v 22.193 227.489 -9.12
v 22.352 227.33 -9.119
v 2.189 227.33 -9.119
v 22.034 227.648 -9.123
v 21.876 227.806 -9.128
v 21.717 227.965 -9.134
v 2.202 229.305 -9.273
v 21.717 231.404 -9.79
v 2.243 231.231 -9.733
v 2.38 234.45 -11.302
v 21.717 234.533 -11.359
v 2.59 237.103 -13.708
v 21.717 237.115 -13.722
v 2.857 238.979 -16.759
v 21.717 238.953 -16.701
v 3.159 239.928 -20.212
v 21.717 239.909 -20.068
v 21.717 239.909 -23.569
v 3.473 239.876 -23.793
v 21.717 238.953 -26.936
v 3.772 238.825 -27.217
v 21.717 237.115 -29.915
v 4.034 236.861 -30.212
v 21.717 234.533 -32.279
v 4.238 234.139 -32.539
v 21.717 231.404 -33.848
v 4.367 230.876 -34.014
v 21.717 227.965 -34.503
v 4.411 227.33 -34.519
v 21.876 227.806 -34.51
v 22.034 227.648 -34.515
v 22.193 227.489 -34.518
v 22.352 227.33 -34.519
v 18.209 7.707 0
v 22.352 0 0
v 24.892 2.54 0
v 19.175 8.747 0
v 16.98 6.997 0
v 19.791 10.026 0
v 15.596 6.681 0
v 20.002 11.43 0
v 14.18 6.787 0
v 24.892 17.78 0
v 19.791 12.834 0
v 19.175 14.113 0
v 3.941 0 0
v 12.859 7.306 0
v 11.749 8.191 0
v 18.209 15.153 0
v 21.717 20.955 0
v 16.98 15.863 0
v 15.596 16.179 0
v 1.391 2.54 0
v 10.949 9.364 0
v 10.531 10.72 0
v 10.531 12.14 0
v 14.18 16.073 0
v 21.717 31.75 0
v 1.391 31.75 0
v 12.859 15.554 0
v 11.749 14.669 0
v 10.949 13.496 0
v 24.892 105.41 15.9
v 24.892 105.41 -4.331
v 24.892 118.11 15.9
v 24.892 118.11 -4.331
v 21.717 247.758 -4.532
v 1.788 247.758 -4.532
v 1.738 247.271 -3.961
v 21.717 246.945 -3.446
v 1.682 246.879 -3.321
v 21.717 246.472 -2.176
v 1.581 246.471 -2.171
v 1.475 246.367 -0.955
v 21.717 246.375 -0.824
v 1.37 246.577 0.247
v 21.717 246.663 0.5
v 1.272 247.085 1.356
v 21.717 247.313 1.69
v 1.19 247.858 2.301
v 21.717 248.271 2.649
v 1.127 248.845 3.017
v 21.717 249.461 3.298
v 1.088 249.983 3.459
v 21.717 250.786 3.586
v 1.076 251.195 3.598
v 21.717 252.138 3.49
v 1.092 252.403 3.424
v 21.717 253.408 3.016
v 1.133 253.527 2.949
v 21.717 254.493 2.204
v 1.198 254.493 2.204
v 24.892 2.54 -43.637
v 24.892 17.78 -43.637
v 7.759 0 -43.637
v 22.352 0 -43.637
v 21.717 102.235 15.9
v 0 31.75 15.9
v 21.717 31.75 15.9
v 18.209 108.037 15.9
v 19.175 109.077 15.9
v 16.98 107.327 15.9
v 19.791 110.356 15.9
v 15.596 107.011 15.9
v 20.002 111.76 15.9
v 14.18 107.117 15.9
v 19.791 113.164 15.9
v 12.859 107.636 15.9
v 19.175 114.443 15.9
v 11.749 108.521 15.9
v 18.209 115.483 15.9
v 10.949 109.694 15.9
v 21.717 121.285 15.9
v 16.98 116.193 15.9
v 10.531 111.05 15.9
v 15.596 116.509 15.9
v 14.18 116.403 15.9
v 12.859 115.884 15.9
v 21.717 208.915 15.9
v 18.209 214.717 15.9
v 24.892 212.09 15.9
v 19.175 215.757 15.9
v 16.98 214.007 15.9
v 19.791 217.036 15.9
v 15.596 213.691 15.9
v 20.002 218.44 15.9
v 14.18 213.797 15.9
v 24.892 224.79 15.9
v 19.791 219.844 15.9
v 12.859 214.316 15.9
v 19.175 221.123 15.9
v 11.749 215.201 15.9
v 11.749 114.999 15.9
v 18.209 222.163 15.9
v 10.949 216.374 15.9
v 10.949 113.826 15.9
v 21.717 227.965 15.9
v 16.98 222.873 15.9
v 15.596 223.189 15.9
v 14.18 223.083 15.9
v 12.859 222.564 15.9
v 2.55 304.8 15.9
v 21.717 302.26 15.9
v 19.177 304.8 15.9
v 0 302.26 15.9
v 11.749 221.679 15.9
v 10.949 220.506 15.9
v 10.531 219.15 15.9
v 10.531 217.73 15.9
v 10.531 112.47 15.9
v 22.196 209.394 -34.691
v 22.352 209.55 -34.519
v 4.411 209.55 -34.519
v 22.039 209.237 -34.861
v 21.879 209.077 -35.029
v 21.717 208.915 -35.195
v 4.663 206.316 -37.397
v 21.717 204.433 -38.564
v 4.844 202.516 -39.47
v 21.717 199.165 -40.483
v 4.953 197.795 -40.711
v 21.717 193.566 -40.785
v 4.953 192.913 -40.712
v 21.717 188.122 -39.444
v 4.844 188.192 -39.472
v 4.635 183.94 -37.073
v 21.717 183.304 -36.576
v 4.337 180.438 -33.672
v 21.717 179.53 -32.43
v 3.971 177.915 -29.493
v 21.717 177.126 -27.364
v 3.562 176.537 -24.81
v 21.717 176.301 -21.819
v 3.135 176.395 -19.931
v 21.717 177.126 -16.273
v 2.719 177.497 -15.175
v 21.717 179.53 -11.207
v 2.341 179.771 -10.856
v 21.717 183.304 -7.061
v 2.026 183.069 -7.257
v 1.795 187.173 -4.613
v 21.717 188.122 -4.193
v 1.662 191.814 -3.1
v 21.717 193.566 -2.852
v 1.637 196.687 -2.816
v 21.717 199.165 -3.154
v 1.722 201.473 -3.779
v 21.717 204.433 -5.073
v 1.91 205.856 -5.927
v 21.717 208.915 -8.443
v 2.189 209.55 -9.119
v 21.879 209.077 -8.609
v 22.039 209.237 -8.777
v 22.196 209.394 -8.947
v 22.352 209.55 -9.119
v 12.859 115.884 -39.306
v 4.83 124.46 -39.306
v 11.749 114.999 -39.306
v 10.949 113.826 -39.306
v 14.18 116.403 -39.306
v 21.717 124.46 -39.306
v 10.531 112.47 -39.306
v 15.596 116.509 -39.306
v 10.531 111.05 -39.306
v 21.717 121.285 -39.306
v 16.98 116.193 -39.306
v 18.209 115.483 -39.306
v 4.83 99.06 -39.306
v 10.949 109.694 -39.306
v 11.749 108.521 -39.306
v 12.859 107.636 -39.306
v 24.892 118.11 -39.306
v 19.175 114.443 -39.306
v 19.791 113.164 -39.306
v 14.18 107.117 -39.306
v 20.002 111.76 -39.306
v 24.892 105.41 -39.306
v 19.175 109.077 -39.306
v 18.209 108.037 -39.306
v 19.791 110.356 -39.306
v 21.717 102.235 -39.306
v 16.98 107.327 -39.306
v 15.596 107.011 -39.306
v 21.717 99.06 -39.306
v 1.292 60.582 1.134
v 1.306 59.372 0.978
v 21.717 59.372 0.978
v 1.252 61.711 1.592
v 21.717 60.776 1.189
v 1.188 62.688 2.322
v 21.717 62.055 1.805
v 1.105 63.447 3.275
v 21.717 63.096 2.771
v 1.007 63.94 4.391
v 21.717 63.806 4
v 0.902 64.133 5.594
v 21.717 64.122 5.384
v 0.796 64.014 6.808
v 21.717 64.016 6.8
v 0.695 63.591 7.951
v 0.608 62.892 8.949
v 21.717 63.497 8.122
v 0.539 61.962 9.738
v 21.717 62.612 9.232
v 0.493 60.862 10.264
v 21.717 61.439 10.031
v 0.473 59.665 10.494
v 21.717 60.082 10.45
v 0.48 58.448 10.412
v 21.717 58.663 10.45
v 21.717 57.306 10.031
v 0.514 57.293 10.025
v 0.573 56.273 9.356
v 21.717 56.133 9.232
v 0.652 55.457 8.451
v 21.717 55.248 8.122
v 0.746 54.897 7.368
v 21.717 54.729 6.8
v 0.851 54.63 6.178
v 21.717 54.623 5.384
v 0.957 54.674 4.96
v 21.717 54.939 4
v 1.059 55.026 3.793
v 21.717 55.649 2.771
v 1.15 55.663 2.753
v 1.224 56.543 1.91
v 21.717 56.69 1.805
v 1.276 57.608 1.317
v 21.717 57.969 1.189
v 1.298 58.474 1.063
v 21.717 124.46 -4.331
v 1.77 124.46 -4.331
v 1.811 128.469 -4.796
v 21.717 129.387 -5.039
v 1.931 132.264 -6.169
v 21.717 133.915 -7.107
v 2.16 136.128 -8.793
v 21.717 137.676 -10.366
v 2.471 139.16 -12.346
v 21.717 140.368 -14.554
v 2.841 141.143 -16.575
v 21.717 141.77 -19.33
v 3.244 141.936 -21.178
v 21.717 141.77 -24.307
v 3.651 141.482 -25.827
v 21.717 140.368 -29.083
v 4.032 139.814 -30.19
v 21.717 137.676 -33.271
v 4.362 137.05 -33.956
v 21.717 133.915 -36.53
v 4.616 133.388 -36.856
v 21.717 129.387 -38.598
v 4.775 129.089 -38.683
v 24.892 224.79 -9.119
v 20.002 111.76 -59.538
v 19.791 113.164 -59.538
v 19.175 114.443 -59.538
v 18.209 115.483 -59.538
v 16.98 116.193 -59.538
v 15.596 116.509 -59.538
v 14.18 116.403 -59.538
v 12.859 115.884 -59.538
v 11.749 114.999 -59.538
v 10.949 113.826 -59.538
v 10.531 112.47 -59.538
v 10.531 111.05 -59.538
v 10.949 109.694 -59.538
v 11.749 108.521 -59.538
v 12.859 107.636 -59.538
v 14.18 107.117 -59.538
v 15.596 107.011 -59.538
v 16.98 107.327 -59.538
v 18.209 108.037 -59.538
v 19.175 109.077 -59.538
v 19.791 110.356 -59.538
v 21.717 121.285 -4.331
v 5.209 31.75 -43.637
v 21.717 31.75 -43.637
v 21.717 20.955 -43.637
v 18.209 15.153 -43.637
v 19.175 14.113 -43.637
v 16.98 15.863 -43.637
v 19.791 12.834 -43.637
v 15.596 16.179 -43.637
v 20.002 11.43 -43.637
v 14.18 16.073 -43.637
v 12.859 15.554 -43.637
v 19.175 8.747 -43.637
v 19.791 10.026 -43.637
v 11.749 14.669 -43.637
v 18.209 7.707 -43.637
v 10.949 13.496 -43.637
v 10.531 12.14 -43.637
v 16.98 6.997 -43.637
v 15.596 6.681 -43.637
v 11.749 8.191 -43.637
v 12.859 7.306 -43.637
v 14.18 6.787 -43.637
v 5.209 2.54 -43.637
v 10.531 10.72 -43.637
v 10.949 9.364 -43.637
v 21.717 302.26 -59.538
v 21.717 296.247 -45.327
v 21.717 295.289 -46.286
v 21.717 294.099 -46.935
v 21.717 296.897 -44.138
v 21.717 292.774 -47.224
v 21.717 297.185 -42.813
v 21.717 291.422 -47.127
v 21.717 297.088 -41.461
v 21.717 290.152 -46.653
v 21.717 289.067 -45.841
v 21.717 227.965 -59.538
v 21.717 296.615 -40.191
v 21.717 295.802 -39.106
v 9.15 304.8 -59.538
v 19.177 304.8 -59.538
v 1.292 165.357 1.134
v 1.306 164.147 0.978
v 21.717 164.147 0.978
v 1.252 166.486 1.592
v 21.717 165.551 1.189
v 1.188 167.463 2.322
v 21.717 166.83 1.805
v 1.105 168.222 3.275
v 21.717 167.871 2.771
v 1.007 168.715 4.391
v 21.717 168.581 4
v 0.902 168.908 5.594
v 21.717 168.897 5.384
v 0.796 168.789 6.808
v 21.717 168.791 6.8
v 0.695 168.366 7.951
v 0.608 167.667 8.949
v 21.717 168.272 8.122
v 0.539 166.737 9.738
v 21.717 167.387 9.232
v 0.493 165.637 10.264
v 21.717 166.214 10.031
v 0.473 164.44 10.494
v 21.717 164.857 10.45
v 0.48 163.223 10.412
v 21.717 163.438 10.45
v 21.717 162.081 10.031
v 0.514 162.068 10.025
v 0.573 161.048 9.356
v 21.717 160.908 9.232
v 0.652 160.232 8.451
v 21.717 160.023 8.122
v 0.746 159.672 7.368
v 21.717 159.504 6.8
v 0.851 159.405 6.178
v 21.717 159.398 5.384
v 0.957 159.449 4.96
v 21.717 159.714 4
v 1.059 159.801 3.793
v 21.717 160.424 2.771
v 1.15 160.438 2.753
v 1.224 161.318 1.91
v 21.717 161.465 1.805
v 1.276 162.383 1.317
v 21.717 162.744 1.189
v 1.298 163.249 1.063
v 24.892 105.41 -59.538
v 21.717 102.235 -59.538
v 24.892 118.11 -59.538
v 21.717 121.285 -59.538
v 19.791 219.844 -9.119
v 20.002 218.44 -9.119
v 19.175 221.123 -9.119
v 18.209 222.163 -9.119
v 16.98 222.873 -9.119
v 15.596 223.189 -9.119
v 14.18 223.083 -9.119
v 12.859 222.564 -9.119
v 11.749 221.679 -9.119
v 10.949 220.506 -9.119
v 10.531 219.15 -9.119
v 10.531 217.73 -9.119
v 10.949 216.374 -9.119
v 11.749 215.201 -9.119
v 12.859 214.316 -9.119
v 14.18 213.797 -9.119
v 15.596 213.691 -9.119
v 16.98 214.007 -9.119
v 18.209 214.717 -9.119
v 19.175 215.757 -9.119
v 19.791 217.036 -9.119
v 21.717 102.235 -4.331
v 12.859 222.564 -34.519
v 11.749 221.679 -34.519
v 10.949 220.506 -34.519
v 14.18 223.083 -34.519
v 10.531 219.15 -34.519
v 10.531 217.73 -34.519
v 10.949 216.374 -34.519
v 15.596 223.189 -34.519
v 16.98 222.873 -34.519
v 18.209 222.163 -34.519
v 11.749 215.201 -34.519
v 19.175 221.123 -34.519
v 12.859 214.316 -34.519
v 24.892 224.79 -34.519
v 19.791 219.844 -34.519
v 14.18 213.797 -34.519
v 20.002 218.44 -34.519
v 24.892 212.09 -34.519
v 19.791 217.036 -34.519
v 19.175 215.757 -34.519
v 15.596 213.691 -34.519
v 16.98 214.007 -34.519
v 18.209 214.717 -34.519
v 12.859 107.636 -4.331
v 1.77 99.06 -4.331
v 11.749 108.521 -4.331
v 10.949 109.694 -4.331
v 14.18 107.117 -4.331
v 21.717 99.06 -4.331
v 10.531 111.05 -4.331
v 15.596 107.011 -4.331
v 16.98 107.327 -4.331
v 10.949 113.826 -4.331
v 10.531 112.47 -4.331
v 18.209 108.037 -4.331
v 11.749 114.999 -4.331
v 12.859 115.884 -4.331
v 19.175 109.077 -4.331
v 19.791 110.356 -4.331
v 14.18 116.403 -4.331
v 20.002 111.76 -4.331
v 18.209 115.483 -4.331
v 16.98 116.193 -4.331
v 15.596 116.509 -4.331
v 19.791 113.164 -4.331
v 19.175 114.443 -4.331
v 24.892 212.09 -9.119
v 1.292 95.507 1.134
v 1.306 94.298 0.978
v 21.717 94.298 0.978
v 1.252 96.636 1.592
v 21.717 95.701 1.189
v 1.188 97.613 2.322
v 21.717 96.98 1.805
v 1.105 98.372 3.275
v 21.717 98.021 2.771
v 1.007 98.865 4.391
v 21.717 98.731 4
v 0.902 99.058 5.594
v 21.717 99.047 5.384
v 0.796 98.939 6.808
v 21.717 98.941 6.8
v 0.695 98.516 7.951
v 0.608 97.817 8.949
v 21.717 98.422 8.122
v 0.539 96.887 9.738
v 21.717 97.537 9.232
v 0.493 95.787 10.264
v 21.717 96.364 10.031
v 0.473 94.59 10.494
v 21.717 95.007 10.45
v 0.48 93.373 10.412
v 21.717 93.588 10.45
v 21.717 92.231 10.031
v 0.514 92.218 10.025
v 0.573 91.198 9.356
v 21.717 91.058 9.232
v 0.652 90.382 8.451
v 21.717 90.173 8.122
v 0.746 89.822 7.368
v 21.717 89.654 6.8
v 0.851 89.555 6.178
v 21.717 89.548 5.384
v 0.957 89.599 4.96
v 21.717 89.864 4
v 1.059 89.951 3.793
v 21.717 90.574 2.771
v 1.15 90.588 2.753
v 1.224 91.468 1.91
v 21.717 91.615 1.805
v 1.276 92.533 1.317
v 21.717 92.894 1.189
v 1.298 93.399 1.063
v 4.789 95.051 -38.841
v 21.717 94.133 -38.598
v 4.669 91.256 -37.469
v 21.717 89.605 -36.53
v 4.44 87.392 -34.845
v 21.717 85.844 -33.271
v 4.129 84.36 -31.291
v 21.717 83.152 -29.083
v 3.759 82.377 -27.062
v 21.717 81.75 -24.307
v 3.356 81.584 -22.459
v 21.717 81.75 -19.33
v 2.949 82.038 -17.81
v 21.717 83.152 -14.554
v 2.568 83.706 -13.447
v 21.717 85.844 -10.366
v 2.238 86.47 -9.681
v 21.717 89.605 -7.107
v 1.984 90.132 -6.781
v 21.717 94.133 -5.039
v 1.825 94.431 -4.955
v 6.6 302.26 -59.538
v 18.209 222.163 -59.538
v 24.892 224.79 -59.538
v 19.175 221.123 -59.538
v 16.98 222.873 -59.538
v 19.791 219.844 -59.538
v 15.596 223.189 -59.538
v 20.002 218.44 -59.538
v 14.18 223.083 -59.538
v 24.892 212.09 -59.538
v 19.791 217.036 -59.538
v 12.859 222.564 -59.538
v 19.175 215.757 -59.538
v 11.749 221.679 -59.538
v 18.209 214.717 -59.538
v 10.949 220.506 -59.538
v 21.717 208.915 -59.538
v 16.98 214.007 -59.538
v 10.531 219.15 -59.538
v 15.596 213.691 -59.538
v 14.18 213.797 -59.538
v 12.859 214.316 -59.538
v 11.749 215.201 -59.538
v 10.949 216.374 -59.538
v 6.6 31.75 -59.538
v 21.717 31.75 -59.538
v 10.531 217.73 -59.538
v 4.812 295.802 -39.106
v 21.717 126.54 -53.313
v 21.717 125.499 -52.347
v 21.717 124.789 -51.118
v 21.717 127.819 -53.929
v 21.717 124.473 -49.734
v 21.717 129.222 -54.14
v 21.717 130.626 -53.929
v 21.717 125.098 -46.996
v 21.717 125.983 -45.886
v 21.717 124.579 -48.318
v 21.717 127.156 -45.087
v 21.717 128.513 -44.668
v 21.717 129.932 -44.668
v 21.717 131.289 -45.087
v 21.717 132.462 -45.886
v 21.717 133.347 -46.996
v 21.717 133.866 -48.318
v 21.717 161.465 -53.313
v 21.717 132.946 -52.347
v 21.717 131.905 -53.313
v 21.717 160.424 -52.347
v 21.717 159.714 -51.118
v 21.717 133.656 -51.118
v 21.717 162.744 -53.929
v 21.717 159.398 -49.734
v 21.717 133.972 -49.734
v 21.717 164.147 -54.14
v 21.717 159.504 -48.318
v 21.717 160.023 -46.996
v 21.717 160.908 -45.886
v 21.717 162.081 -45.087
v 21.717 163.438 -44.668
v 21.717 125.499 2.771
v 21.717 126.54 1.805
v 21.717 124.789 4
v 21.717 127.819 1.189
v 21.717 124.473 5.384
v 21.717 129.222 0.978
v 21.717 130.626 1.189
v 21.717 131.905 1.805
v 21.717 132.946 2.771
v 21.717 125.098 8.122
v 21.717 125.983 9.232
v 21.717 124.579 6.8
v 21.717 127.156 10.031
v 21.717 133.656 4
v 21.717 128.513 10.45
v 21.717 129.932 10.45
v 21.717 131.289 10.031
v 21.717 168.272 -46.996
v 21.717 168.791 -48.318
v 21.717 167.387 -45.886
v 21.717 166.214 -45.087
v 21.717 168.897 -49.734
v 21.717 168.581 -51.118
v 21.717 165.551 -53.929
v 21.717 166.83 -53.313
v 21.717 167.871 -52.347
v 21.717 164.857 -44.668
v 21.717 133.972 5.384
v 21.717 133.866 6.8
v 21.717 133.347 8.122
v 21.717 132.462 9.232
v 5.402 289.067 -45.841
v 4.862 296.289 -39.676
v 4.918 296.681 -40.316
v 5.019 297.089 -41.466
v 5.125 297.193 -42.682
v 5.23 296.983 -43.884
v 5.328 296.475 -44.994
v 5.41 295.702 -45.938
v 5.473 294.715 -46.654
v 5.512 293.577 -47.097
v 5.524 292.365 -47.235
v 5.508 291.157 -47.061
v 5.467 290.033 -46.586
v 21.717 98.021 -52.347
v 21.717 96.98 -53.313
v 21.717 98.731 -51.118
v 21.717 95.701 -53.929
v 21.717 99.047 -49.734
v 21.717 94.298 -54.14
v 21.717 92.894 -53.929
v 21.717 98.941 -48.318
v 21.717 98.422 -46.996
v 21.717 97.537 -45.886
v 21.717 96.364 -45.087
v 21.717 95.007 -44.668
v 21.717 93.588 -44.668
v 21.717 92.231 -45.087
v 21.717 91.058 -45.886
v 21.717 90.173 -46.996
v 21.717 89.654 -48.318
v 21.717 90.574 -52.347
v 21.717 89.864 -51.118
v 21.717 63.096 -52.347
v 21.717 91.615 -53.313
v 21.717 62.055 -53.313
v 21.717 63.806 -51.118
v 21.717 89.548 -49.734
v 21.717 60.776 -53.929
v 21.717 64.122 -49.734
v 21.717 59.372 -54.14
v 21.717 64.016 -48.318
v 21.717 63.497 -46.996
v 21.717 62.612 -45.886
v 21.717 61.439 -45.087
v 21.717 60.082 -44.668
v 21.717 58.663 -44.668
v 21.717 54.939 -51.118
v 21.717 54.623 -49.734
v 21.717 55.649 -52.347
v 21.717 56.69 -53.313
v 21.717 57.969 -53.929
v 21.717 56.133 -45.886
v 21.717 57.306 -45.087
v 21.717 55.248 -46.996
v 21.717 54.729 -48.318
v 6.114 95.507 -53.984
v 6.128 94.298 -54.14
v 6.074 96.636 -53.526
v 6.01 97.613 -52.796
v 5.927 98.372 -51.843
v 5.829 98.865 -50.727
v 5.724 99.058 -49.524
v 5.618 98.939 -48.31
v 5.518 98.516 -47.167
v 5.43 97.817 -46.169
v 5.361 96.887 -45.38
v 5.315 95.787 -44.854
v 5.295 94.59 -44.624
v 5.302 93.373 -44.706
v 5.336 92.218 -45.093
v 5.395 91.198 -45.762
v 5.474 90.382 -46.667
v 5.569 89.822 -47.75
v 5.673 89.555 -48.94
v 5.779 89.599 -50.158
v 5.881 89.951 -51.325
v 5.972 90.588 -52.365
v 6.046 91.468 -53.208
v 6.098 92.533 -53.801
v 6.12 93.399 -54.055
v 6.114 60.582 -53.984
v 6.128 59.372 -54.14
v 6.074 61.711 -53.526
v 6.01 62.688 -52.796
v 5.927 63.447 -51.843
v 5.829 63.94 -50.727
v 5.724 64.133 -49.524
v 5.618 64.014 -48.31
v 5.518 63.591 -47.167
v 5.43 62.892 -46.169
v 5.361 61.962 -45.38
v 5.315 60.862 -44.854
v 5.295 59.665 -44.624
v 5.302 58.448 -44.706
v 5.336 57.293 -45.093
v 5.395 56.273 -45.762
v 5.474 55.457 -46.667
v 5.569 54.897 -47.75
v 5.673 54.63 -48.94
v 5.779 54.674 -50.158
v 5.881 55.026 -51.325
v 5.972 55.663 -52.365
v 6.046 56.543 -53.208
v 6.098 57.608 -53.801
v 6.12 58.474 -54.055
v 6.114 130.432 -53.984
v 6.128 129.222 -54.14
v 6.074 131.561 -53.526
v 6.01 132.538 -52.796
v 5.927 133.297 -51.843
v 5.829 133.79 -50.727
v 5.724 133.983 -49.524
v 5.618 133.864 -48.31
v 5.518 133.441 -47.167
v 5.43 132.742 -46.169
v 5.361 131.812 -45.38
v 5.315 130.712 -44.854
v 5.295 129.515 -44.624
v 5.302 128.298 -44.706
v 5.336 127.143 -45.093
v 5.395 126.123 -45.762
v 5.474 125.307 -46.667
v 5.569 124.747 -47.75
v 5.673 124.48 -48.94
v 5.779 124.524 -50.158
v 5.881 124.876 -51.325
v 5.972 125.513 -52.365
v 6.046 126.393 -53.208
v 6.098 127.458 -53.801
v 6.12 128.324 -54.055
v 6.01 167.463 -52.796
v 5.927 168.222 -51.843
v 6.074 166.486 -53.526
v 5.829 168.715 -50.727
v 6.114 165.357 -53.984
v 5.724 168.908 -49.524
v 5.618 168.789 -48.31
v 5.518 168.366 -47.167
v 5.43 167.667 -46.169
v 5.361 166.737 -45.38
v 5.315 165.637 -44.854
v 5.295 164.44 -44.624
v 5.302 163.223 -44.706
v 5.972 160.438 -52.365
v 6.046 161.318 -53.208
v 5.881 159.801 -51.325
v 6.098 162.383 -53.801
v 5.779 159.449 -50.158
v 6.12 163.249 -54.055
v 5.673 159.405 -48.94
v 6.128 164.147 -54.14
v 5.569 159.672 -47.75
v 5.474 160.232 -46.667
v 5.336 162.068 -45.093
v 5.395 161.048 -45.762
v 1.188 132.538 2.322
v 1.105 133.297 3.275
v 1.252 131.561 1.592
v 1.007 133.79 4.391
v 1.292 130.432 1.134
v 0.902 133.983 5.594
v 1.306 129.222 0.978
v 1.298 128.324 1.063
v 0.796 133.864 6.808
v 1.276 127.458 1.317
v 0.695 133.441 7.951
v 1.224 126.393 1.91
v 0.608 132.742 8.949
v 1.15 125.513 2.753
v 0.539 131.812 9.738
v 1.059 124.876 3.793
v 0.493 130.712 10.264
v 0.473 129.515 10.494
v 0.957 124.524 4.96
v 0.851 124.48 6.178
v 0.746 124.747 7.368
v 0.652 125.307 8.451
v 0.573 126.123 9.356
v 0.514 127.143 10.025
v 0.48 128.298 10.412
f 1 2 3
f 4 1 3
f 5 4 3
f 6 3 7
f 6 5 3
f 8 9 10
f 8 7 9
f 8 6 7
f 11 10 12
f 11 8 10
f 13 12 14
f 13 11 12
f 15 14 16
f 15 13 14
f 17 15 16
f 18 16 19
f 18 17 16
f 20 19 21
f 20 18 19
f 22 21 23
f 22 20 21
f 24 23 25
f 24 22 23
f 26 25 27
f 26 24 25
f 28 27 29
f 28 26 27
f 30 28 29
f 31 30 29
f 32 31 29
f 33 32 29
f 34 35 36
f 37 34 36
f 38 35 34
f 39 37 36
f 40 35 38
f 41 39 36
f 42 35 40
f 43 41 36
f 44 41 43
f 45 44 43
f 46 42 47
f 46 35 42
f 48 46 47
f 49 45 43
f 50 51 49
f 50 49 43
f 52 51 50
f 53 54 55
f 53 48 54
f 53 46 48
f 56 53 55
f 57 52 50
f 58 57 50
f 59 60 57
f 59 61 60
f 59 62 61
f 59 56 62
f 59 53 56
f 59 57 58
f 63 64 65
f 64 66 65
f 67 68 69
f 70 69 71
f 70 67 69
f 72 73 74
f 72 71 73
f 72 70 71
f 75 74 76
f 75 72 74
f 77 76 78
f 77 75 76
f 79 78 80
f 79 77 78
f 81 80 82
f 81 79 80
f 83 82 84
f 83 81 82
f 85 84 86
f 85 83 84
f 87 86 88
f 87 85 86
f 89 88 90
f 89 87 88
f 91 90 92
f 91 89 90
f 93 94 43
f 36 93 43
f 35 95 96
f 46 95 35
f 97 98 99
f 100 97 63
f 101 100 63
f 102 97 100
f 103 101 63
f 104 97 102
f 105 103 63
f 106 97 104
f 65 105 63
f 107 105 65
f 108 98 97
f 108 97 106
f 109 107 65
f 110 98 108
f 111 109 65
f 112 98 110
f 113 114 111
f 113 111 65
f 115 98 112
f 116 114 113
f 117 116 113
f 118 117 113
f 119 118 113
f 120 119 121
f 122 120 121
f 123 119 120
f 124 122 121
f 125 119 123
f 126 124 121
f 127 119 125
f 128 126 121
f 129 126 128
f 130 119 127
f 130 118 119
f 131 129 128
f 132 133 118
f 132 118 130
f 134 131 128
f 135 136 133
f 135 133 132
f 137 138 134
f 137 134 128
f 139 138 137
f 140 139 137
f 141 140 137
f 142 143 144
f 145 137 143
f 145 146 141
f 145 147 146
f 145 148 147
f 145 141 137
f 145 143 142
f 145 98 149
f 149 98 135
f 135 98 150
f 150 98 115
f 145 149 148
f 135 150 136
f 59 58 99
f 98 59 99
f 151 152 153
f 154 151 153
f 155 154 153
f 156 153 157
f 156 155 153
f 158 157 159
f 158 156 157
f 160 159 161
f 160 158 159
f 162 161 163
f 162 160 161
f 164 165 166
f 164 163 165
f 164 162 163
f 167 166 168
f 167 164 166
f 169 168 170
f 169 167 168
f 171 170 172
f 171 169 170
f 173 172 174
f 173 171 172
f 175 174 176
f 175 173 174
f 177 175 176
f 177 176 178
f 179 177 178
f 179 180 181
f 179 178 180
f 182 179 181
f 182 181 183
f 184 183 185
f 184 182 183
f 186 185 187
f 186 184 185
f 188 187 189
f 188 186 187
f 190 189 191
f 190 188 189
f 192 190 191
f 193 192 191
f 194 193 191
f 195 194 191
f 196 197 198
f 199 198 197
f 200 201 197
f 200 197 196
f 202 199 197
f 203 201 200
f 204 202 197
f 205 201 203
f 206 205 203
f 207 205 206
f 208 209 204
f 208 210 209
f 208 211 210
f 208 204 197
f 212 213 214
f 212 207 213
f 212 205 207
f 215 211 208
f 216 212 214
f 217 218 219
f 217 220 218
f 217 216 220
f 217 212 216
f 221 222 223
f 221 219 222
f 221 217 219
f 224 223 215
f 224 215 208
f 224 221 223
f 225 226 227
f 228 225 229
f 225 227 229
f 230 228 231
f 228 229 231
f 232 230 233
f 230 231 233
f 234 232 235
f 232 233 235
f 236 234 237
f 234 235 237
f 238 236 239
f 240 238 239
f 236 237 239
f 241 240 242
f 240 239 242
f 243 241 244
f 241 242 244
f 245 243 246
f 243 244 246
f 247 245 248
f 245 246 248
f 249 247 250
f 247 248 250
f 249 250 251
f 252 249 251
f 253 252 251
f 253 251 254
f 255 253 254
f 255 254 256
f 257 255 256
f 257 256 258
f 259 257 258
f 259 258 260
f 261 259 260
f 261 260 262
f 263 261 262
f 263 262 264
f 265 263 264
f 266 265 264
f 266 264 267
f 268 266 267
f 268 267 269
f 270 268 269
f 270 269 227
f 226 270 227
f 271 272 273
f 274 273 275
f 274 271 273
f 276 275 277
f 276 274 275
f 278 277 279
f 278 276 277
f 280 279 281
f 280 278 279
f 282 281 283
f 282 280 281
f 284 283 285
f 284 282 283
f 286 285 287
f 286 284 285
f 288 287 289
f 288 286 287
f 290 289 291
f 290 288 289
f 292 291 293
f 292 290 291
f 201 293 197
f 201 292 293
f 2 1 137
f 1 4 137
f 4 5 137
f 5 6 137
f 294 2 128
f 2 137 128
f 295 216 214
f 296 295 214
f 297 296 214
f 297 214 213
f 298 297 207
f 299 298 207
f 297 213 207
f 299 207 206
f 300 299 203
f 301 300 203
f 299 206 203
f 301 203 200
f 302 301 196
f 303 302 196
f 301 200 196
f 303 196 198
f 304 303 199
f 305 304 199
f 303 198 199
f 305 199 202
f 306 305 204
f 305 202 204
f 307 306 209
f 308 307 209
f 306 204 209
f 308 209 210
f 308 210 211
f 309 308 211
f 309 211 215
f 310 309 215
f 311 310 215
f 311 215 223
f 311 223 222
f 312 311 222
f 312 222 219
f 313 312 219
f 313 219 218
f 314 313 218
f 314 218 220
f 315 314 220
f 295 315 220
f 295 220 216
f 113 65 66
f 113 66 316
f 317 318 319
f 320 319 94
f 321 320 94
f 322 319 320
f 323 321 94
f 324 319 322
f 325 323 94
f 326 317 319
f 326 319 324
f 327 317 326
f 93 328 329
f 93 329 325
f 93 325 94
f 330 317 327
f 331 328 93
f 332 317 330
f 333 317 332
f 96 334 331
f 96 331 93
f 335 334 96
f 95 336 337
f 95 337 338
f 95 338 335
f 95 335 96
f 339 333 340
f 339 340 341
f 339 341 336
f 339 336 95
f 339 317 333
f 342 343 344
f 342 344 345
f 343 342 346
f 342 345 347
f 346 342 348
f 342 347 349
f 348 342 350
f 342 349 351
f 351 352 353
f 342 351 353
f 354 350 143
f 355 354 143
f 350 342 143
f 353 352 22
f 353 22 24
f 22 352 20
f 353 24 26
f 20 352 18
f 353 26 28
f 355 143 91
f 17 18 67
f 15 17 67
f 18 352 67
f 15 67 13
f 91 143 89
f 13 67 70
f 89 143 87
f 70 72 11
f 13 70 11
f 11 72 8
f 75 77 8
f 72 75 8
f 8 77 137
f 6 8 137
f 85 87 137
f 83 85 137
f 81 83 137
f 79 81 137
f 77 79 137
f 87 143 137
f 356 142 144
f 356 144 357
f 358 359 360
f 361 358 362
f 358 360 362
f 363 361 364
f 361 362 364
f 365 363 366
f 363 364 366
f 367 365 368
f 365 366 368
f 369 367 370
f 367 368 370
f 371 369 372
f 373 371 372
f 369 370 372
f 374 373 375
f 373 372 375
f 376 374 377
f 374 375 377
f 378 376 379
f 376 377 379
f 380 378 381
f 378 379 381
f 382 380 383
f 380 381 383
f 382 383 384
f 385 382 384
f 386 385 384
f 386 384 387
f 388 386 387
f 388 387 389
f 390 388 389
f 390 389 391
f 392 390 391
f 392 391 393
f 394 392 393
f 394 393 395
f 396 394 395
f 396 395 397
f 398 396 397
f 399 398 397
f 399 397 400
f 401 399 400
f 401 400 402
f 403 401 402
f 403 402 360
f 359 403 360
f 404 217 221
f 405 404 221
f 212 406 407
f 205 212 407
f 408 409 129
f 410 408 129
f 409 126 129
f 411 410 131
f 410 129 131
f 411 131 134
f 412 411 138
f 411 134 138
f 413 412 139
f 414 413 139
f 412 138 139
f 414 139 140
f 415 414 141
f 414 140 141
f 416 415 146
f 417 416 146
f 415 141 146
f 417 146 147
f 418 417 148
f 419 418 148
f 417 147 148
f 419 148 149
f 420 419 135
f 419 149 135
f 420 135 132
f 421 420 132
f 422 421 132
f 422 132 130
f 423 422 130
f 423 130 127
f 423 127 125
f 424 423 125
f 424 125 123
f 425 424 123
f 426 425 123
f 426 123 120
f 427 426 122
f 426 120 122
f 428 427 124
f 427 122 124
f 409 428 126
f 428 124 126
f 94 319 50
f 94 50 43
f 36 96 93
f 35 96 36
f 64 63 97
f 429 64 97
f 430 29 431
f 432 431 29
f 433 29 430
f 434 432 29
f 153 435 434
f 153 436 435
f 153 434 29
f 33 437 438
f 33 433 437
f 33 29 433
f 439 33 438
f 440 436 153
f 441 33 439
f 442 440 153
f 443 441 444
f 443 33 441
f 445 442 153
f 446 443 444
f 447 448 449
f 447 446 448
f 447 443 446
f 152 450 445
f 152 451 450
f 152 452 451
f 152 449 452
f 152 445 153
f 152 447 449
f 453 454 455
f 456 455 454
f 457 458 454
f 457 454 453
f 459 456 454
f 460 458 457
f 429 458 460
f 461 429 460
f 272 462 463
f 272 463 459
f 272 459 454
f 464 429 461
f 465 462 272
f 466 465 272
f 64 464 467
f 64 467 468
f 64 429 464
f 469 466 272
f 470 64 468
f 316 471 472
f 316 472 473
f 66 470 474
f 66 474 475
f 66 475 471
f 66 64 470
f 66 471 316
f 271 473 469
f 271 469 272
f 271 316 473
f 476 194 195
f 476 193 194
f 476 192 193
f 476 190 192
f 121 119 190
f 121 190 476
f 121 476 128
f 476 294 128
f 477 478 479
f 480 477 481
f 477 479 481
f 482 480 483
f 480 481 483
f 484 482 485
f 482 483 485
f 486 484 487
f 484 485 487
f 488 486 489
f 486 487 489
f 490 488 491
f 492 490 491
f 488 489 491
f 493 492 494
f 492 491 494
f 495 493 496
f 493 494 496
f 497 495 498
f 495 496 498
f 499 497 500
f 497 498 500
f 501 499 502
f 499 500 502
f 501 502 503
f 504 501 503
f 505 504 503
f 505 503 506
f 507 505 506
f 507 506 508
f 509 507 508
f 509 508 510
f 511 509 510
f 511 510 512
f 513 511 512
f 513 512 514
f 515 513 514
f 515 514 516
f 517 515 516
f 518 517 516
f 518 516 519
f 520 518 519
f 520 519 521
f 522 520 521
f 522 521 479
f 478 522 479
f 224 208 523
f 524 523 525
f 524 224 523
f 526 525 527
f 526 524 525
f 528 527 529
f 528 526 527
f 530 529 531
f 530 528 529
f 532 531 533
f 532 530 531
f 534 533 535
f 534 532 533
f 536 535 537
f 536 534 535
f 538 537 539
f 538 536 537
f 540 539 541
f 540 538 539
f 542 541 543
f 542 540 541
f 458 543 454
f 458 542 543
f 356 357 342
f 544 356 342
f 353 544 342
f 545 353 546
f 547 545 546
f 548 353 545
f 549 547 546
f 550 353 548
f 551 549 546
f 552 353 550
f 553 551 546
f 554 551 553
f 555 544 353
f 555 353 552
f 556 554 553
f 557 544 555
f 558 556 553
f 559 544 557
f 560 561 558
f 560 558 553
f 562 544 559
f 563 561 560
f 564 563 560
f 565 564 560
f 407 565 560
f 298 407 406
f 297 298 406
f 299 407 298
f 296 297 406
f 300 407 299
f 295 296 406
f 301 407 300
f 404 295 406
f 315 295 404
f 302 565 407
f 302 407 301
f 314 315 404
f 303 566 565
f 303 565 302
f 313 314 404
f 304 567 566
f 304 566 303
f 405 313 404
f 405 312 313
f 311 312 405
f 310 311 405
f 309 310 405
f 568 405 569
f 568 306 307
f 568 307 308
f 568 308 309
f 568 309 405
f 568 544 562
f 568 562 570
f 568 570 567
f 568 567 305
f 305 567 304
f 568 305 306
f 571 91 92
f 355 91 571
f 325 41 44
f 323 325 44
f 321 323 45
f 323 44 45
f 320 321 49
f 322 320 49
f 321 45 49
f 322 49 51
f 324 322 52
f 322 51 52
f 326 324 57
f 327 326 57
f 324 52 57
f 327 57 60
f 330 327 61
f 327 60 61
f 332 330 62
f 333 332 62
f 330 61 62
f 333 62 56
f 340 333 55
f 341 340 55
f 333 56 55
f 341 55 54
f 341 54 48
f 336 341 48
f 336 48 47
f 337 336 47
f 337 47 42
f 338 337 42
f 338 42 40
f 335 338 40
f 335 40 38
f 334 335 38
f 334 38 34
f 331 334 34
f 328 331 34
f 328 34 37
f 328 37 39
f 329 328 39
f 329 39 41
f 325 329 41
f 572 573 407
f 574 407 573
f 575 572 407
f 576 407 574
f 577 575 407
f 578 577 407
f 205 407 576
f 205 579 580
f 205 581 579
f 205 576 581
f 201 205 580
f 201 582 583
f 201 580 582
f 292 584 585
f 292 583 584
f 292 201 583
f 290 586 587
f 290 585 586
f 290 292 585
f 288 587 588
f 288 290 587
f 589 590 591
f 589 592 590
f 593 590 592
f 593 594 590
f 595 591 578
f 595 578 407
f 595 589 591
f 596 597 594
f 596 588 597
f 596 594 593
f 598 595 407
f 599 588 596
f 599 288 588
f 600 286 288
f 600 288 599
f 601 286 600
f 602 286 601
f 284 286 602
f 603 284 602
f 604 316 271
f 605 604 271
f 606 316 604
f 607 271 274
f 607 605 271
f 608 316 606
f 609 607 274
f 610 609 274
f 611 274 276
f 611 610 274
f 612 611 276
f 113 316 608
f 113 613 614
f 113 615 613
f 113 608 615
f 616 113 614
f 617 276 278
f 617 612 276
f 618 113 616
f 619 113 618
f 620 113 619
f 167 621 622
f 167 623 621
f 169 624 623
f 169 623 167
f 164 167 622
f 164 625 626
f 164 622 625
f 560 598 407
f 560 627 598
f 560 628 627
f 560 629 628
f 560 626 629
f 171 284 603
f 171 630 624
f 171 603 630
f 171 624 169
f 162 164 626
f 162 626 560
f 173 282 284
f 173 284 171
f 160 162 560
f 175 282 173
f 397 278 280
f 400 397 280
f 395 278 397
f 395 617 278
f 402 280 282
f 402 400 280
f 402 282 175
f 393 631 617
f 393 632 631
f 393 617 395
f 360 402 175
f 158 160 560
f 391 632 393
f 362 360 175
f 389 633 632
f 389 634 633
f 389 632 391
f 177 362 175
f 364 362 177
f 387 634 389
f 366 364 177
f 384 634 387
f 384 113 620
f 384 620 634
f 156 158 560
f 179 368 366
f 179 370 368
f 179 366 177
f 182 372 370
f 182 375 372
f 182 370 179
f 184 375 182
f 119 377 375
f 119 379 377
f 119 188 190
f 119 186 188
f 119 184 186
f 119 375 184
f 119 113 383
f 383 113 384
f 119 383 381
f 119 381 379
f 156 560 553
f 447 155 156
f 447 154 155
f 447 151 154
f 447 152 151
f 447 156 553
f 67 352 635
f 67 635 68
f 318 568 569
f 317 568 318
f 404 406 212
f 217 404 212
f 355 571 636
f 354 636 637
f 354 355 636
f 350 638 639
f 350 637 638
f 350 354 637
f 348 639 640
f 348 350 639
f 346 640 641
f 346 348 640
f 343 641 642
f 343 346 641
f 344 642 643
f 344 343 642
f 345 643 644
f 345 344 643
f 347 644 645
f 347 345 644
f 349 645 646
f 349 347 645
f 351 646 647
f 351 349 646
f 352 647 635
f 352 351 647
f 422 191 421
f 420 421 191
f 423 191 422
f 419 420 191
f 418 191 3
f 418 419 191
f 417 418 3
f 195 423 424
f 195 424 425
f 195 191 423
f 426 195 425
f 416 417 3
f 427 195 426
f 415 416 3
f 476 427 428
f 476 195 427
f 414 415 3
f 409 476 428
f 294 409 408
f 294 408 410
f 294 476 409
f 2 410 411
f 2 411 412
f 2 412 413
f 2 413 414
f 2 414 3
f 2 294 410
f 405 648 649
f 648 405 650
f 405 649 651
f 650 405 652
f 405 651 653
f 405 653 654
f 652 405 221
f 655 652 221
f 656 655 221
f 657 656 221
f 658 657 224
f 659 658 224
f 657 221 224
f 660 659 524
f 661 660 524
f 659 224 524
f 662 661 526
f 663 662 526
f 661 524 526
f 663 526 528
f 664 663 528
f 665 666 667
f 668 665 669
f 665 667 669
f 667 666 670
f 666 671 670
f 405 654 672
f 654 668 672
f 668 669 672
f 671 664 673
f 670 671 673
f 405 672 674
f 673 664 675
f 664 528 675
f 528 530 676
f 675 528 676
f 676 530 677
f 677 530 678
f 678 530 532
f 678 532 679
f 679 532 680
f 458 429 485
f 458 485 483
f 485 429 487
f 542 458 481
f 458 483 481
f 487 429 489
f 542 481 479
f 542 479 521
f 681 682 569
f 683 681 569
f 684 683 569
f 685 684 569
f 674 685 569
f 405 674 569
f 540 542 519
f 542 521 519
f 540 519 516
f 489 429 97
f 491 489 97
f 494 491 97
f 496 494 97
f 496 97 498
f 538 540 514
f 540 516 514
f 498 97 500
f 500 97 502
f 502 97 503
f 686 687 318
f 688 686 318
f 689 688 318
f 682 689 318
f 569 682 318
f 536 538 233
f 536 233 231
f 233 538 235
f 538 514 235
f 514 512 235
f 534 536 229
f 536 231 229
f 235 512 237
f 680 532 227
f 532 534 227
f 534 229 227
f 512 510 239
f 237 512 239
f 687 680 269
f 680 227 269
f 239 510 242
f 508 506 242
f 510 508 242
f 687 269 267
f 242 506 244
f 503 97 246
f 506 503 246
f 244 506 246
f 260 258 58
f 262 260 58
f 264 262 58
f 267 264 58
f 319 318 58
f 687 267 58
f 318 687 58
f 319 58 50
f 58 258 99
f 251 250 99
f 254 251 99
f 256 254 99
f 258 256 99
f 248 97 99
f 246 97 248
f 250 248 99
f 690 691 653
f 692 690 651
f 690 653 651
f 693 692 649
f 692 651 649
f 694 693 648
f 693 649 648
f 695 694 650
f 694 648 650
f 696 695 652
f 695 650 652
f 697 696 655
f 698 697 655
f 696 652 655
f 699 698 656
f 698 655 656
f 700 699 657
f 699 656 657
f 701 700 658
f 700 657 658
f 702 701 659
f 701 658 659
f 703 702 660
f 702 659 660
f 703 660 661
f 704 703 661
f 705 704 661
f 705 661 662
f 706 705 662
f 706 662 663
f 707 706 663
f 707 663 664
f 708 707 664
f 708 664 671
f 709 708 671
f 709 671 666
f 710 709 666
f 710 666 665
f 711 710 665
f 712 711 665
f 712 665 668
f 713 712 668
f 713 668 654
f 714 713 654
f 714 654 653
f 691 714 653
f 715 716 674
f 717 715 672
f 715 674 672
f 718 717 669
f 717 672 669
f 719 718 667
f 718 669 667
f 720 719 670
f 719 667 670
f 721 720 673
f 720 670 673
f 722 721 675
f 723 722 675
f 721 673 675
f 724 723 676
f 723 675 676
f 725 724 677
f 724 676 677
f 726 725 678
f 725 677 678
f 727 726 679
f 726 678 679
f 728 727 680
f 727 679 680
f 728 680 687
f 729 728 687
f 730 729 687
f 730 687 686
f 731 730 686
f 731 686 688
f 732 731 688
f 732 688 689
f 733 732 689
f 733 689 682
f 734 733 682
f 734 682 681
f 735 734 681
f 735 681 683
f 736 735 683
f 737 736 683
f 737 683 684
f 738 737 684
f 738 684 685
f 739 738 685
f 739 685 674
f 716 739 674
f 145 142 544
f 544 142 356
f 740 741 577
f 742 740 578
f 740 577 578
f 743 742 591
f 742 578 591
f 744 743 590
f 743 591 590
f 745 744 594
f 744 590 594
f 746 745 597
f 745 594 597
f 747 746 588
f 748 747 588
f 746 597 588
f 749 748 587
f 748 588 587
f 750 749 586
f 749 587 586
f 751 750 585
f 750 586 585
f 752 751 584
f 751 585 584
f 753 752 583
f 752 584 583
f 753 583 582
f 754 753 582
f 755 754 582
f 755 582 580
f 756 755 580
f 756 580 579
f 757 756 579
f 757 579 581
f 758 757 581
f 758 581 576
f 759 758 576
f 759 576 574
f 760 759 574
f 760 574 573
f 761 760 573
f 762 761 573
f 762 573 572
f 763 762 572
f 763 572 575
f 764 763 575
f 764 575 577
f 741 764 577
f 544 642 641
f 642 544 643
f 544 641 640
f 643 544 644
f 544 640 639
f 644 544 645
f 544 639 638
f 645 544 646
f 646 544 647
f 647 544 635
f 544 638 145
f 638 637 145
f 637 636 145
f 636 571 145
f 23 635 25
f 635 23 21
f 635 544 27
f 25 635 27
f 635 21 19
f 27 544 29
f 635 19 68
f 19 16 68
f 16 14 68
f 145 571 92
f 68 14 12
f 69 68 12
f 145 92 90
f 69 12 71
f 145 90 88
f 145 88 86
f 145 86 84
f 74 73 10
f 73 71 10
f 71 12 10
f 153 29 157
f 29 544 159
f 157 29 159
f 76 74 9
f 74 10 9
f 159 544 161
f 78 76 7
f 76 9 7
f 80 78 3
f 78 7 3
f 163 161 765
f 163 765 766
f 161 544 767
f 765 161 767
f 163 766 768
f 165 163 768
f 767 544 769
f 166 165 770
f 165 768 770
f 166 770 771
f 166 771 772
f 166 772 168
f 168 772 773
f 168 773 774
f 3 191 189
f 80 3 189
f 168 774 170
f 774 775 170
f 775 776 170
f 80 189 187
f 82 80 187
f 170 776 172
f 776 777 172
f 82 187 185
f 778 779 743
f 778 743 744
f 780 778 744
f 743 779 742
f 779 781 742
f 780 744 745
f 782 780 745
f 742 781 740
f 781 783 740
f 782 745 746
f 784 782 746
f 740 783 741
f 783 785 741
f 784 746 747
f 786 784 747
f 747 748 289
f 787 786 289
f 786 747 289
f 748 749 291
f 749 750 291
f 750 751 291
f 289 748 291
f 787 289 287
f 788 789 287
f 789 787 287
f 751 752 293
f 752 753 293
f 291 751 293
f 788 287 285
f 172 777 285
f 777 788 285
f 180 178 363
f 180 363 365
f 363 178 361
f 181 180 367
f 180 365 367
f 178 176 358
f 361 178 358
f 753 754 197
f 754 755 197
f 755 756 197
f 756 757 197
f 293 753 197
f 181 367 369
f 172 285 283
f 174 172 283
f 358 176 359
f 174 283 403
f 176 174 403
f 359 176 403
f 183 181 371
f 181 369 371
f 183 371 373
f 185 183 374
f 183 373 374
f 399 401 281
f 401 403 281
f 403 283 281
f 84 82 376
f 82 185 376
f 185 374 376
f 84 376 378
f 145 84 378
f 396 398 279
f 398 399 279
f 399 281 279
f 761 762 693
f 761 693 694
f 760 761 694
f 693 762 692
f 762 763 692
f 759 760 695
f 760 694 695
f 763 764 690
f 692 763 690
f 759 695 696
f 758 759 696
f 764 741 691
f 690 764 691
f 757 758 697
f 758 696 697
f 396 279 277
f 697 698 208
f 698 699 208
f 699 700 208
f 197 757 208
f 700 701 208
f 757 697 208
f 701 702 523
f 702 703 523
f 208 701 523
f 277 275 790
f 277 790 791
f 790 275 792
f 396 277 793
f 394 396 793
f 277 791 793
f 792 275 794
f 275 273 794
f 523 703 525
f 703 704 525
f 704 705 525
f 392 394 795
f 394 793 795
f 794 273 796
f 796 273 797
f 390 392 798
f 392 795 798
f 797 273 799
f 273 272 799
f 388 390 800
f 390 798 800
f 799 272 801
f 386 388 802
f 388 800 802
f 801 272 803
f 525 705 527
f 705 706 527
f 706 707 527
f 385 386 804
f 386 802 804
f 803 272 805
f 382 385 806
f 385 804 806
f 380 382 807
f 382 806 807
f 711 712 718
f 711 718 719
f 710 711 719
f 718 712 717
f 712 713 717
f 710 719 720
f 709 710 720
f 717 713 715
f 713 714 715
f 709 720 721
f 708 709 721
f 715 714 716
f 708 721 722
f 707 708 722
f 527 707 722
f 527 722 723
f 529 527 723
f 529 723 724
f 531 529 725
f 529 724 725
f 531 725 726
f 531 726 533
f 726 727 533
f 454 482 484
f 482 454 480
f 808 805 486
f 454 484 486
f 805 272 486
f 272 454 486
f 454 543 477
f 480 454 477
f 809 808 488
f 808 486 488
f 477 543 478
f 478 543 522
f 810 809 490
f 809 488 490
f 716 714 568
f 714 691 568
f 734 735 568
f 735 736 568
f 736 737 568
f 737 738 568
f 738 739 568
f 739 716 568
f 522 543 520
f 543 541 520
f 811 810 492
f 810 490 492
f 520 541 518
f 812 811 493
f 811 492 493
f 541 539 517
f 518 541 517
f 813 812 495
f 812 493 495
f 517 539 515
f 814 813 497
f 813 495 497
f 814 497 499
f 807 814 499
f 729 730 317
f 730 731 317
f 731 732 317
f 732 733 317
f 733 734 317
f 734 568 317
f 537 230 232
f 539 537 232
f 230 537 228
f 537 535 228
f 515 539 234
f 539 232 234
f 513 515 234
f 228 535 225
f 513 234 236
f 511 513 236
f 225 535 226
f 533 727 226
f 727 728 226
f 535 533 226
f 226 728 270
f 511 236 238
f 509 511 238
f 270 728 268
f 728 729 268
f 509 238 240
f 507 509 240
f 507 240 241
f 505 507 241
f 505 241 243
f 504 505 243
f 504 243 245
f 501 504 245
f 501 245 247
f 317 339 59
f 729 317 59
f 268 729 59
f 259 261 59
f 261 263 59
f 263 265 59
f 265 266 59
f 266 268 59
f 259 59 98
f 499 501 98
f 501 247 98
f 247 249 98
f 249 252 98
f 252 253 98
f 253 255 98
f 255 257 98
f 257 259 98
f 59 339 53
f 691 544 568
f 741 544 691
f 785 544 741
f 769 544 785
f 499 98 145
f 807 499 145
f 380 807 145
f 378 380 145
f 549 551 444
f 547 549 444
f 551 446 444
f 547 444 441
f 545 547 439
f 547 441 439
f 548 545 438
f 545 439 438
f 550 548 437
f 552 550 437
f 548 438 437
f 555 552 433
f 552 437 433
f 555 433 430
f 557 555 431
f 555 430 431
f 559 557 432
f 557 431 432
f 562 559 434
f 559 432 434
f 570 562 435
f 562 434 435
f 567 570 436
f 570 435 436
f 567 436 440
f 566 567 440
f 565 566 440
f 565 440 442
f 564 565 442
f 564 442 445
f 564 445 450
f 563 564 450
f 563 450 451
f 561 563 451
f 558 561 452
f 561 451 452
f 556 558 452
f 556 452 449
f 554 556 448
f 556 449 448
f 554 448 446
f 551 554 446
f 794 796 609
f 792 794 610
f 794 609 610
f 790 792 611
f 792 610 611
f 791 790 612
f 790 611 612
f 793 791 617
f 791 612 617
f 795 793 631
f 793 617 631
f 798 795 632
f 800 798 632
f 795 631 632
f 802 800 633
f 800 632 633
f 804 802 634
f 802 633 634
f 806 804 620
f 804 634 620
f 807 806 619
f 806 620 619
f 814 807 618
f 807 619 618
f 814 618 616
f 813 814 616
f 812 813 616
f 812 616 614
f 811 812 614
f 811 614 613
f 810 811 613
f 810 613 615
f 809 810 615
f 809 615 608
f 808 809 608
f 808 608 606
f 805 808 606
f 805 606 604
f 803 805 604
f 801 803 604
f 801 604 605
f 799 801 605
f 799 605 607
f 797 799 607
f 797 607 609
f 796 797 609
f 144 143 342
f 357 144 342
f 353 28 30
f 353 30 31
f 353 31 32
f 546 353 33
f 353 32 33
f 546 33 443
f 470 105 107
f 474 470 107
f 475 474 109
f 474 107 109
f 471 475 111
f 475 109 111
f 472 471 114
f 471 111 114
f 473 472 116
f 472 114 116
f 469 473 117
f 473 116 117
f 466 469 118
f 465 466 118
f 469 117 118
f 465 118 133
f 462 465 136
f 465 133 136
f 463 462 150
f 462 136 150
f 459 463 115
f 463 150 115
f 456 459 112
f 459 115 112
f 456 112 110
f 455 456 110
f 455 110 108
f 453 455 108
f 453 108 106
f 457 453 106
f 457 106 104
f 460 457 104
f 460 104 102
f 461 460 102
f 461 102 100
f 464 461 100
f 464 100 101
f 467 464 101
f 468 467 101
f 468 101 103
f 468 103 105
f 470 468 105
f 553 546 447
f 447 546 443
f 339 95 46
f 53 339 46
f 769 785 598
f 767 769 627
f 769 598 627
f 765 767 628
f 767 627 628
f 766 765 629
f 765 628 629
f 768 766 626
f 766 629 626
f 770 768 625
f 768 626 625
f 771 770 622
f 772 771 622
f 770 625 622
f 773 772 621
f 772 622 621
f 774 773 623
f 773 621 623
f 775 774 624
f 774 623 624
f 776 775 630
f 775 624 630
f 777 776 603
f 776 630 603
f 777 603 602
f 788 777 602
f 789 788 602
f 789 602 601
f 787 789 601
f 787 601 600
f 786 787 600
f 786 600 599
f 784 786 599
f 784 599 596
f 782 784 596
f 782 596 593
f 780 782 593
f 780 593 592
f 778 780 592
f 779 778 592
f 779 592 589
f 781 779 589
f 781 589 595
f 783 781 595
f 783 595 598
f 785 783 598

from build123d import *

# Parameters (mm, degrees)
BOSS_EXTRUDE1_DEPTH = 24.892
CUT_EXTRUDE8_DEPTH  = 25.892
CUT_EXTRUDE6_DEPTH  = 305.8
SKETCH9_R           = 4.7625
CUT_EXTRUDE7_DEPTH  = 76.2
SKETCH2_R           = 4.7625
CUT_EXTRUDE1_DEPTH  = 76.438
SKETCH3_R           = 4.7625
CUT_EXTRUDE2_DEPTH  = 60.5376
CUT_EXTRUDE9_DEPTH  = 25.892
CUT_EXTRUDE10_DEPTH = 76.438
SKETCH6_R           = 4.7625
CUT_EXTRUDE4_DEPTH  = 25.892
LPATTERN1_COUNT     = 3
LPATTERN1_PITCH     = 34.925
LPATTERN1_COL_COUNT = 2
LPATTERN1_COL_PITCH = 34.925
CHAMFER1_SIZE       = 2.54


with BuildPart() as part:
    # Sketch1 → Boss-Extrude1 (new body)
    with BuildSketch(Plane(origin=(0, 0, 0), x_dir=(0, 0, -1), z_dir=(1, 0, 0))):
        Polygon((0, 0), (0, 31.75), (-15.9004, 31.75), (-15.9004, 304.8), (59.5376, 304.8), (59.5376, 31.75), (43.6372, 31.75), (43.6372, 0), align=None)
    extrude(amount=BOSS_EXTRUDE1_DEPTH)

    # Sketch11 → Cut-Extrude8 (cut, through all)
    with BuildSketch(Plane(origin=(24.892, 0, 0), x_dir=(0, 0, -1), z_dir=(1, 0, 0))):
        with BuildLine():
            Line((39.3065, 124.46), (39.3065, 99.06))
            ThreePointArc((39.3065, 99.06), (21.8186, 81.5721), (4.3307, 99.06))
            Line((4.3307, 99.06), (4.3307, 124.46))
            ThreePointArc((4.3307, 124.46), (21.8186, 141.9479), (39.3065, 124.46))
        make_face()
        with BuildLine():
            Line((34.5186, 227.33), (34.5186, 209.55))
            ThreePointArc((34.5186, 209.55), (21.8186, 176.300968343), (9.1186, 209.55))
            Line((9.1186, 209.55), (9.1186, 227.33))
            ThreePointArc((9.1186, 227.33), (21.8186, 240.03), (34.5186, 227.33))
        make_face()
    extrude(amount=-CUT_EXTRUDE8_DEPTH, mode=Mode.SUBTRACT)

    # Sketch8 → Cut-Extrude6 (cut, through all)
    with BuildSketch(Plane(origin=(0, 0, 0), x_dir=(1, 0, 0), z_dir=(0, 1, 0))):
        Polygon((0, 59.5376), (6.599969799, 59.5376), (0, -15.9004), align=None)
    extrude(amount=CUT_EXTRUDE6_DEPTH, mode=Mode.SUBTRACT)

    # Sketch9 → Cut-Extrude7 (cut, symmetric)
    with BuildSketch(Plane.XY.offset(15.9004)):
        with Locations((15.24, 218.44)):
            Circle(SKETCH9_R)
    extrude(amount=CUT_EXTRUDE7_DEPTH, both=True, mode=Mode.SUBTRACT)

    # Sketch2 → Cut-Extrude1 (cut, through all)
    with BuildSketch(Plane.XY.offset(15.9004)):
        with Locations((15.24, 111.76)):
            Circle(SKETCH2_R)
    extrude(amount=-CUT_EXTRUDE1_DEPTH, mode=Mode.SUBTRACT)

    # Sketch3 → Cut-Extrude2 (cut, through all)
    with BuildSketch(Plane.XY):
        with Locations((15.24, 11.43)):
            Circle(SKETCH3_R)
    extrude(amount=-CUT_EXTRUDE2_DEPTH, mode=Mode.SUBTRACT)

    # Sketch12 → Cut-Extrude9 (cut, through all)
    with BuildSketch(Plane(origin=(24.892, 0, 0), x_dir=(0, 0, -1), z_dir=(1, 0, 0))):
        with BuildLine():
            Line((-2.203585124, 254.493006967), (39.105593033, 295.802185124))
            ThreePointArc((39.105593033, 295.802185124), (45.840785124, 295.802185124), (45.840785124, 289.066993033))
            Line((45.840785124, 289.066993033), (4.531606967, 247.757814876))
            ThreePointArc((4.531606967, 247.757814876), (-2.203585124, 247.757814876), (-2.203585124, 254.493006967))
        make_face()
    extrude(amount=-CUT_EXTRUDE9_DEPTH, mode=Mode.SUBTRACT)

    # Sketch13 → Cut-Extrude10 (cut, through all)
    with BuildSketch(Plane.XY.offset(15.9004)):
        Polygon((24.892, 304.8), (21.717, 304.8), (21.717, 227.965), (24.892, 224.79), align=None)
        Polygon((21.717, 121.285), (21.717, 208.915), (24.892, 212.09), (24.892, 118.11), align=None)
        Polygon((24.892, 17.78), (24.892, 105.41), (21.717, 102.235), (21.717, 20.955), align=None)
    extrude(amount=-CUT_EXTRUDE10_DEPTH, mode=Mode.SUBTRACT)

    # Sketch6 → Cut-Extrude4 (cut, through all)
    with BuildSketch(Plane(origin=(24.892, 0, 0), x_dir=(0, 0, -1), z_dir=(1, 0, 0))):
        with Locations((-5.7404, 94.2975)):
            Circle(SKETCH6_R)
        with Locations((49.3776, 94.2975)):
            Circle(SKETCH6_R)
    cut_extrude4 = extrude(amount=-CUT_EXTRUDE4_DEPTH, mode=Mode.SUBTRACT)

    # LPattern1: Cut-Extrude4 ×3
    with Locations(*[(0, i * LPATTERN1_PITCH, 0) for i in range(1, LPATTERN1_COUNT)]):
        add(cut_extrude4, mode=Mode.SUBTRACT)

    # LPattern1 col: Cut-Extrude4 ×2
    with Locations(*[(0, -i * LPATTERN1_COL_PITCH, 0) for i in range(1, LPATTERN1_COL_COUNT)]):
        add(cut_extrude4, mode=Mode.SUBTRACT)

    # Chamfer1
    chamfer1_edges = [part.edges().sort_by_distance(p)[0] for p in [
        (21.717, 304.8, -21.8186),
        (24.892, 0, -21.8186),
        (3.2999849, 0, -21.8186),
        (3.2999849, 304.8, -21.8186),
    ]]
    chamfer(chamfer1_edges, length=CHAMFER1_SIZE)


solid = part.part
